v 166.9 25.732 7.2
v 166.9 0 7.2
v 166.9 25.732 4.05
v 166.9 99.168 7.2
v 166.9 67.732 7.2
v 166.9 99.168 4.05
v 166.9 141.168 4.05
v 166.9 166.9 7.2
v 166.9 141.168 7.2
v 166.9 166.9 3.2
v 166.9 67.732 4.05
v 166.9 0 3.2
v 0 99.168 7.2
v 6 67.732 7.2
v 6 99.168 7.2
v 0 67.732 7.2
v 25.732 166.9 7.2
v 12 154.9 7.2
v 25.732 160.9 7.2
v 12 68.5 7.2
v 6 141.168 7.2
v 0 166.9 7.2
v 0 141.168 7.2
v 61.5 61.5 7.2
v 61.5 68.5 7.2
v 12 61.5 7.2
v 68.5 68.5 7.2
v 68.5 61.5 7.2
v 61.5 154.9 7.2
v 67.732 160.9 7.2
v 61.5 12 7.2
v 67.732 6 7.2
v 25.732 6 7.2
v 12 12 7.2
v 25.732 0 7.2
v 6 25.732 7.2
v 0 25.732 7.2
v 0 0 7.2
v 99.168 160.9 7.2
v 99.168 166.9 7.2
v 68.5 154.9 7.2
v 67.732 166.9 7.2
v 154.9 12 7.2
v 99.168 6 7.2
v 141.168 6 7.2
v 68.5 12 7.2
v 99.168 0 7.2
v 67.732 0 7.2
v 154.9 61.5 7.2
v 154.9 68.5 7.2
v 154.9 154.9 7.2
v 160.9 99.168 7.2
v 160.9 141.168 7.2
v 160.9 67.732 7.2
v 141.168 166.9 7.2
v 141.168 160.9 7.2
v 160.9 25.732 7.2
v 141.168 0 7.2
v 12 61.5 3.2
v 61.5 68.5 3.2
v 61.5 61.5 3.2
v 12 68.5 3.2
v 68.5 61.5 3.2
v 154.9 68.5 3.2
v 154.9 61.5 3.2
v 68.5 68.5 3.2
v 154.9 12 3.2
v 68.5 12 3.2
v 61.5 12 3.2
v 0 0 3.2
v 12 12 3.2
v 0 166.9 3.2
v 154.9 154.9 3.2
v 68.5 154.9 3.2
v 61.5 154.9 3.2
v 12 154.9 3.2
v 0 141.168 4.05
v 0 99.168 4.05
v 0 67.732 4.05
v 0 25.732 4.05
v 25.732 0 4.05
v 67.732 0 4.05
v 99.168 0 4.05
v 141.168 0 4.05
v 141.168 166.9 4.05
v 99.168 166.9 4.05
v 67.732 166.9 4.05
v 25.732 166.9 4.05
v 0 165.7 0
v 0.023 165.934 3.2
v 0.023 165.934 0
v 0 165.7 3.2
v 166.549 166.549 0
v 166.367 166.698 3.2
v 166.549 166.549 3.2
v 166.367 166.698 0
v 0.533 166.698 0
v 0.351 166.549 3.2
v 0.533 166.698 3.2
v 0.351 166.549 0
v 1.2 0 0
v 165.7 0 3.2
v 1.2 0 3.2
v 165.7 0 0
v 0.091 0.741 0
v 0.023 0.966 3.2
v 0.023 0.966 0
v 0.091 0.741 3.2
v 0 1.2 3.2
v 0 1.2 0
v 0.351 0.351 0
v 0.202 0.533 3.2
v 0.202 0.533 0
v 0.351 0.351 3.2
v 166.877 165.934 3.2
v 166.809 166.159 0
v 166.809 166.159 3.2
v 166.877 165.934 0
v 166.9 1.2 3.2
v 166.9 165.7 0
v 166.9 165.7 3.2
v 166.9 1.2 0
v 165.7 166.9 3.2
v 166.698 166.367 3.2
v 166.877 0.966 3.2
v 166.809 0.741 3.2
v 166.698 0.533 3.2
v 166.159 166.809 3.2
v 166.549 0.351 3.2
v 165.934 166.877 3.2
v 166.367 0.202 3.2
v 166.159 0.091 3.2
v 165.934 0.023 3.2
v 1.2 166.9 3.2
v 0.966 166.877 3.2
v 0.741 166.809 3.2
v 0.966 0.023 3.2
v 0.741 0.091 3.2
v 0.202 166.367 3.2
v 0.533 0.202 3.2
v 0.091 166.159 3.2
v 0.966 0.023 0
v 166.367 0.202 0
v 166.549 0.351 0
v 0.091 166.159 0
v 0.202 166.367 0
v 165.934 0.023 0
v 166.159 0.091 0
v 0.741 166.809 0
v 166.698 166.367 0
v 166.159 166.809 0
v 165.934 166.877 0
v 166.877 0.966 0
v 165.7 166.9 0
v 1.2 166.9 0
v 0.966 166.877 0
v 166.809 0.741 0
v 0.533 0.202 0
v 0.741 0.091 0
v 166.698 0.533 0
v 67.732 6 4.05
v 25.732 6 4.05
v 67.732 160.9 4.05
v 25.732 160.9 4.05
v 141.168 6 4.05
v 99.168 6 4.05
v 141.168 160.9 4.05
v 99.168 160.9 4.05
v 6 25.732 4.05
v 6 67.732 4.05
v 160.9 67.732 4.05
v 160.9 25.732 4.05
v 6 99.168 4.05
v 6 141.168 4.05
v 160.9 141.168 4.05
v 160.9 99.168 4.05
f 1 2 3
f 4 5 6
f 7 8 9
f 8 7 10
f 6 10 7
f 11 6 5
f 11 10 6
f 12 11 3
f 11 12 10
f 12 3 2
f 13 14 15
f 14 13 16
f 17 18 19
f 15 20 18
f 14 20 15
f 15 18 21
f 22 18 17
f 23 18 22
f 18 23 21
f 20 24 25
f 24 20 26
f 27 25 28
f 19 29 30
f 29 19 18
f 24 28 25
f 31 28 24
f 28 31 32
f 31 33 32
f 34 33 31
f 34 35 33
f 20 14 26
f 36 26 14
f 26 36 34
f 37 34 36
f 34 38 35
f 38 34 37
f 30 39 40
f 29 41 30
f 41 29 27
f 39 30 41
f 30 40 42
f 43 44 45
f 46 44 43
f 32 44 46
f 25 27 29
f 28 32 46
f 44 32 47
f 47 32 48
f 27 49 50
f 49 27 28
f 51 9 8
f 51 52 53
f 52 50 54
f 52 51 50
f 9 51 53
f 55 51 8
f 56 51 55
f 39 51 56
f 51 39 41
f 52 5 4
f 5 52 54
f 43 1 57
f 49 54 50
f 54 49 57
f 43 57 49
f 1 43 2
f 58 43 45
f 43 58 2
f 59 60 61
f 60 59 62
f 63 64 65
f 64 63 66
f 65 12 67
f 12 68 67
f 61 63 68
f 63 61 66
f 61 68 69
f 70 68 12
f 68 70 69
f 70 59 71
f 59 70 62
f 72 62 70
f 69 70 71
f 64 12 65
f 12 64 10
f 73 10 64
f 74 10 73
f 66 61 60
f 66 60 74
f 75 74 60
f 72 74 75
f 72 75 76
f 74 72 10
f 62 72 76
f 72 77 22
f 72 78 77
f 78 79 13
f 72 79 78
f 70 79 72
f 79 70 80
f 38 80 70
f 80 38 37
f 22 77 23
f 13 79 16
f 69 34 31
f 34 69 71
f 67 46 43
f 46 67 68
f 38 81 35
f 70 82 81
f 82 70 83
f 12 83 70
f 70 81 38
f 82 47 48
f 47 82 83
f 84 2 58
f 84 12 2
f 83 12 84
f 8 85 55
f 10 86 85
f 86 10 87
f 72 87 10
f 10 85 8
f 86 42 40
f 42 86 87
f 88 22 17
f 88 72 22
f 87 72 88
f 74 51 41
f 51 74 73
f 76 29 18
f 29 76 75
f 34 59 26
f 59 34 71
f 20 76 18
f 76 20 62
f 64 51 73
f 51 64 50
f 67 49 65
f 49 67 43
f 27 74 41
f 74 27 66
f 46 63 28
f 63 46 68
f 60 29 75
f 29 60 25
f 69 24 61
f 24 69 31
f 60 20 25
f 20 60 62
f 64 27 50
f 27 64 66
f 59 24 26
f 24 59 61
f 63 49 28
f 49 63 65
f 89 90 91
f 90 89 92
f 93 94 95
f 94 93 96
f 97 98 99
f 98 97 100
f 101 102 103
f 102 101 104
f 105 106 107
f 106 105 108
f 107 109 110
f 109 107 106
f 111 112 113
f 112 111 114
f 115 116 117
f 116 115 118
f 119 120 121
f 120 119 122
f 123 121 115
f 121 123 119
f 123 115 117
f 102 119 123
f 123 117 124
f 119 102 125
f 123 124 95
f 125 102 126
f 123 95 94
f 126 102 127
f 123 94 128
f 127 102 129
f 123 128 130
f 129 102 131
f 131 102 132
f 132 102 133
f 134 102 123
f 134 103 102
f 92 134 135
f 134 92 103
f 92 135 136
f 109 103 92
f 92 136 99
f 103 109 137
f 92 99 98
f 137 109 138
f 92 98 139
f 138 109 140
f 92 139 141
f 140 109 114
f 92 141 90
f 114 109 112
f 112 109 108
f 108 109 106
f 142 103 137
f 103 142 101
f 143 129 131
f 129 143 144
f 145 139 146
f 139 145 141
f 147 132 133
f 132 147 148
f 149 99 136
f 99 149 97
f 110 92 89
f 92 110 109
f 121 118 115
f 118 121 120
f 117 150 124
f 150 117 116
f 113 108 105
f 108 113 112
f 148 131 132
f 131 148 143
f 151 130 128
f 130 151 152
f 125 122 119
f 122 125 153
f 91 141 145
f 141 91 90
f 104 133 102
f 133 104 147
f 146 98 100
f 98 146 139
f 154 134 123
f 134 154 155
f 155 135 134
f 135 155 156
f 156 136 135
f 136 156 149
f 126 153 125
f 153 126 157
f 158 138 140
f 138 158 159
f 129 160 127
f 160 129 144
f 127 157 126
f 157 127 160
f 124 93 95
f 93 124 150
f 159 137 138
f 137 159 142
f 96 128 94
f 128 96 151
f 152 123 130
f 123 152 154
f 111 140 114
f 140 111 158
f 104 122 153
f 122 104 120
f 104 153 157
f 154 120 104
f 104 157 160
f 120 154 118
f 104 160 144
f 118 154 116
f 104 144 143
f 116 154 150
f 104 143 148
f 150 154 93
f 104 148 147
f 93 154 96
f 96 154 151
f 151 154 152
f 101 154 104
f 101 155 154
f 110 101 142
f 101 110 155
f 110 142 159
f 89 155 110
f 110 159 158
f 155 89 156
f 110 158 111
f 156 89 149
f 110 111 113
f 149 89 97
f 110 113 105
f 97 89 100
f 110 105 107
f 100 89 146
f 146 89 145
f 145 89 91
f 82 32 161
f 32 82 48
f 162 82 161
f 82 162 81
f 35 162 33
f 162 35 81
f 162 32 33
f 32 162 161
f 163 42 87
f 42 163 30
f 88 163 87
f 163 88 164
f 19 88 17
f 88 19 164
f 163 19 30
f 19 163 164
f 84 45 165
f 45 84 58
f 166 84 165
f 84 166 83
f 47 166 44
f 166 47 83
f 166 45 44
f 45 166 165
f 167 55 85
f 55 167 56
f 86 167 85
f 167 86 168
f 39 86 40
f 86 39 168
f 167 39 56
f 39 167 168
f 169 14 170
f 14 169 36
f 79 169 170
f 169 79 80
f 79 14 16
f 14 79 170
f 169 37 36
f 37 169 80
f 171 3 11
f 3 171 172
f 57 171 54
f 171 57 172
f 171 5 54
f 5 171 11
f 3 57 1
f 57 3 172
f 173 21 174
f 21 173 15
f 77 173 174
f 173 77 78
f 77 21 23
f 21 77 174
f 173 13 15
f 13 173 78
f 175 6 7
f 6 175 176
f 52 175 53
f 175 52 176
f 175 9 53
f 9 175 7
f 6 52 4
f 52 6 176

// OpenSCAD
/*
Wall outer skin tile, plain.
Print orientation: large flat outside face on the bed, ribs and key recesses upward.
Quantity: print enough for wall positions that do not need foam fill/vent ports.
*/

use <../planter_support_free.scad>

export_wall_outer_tile();
